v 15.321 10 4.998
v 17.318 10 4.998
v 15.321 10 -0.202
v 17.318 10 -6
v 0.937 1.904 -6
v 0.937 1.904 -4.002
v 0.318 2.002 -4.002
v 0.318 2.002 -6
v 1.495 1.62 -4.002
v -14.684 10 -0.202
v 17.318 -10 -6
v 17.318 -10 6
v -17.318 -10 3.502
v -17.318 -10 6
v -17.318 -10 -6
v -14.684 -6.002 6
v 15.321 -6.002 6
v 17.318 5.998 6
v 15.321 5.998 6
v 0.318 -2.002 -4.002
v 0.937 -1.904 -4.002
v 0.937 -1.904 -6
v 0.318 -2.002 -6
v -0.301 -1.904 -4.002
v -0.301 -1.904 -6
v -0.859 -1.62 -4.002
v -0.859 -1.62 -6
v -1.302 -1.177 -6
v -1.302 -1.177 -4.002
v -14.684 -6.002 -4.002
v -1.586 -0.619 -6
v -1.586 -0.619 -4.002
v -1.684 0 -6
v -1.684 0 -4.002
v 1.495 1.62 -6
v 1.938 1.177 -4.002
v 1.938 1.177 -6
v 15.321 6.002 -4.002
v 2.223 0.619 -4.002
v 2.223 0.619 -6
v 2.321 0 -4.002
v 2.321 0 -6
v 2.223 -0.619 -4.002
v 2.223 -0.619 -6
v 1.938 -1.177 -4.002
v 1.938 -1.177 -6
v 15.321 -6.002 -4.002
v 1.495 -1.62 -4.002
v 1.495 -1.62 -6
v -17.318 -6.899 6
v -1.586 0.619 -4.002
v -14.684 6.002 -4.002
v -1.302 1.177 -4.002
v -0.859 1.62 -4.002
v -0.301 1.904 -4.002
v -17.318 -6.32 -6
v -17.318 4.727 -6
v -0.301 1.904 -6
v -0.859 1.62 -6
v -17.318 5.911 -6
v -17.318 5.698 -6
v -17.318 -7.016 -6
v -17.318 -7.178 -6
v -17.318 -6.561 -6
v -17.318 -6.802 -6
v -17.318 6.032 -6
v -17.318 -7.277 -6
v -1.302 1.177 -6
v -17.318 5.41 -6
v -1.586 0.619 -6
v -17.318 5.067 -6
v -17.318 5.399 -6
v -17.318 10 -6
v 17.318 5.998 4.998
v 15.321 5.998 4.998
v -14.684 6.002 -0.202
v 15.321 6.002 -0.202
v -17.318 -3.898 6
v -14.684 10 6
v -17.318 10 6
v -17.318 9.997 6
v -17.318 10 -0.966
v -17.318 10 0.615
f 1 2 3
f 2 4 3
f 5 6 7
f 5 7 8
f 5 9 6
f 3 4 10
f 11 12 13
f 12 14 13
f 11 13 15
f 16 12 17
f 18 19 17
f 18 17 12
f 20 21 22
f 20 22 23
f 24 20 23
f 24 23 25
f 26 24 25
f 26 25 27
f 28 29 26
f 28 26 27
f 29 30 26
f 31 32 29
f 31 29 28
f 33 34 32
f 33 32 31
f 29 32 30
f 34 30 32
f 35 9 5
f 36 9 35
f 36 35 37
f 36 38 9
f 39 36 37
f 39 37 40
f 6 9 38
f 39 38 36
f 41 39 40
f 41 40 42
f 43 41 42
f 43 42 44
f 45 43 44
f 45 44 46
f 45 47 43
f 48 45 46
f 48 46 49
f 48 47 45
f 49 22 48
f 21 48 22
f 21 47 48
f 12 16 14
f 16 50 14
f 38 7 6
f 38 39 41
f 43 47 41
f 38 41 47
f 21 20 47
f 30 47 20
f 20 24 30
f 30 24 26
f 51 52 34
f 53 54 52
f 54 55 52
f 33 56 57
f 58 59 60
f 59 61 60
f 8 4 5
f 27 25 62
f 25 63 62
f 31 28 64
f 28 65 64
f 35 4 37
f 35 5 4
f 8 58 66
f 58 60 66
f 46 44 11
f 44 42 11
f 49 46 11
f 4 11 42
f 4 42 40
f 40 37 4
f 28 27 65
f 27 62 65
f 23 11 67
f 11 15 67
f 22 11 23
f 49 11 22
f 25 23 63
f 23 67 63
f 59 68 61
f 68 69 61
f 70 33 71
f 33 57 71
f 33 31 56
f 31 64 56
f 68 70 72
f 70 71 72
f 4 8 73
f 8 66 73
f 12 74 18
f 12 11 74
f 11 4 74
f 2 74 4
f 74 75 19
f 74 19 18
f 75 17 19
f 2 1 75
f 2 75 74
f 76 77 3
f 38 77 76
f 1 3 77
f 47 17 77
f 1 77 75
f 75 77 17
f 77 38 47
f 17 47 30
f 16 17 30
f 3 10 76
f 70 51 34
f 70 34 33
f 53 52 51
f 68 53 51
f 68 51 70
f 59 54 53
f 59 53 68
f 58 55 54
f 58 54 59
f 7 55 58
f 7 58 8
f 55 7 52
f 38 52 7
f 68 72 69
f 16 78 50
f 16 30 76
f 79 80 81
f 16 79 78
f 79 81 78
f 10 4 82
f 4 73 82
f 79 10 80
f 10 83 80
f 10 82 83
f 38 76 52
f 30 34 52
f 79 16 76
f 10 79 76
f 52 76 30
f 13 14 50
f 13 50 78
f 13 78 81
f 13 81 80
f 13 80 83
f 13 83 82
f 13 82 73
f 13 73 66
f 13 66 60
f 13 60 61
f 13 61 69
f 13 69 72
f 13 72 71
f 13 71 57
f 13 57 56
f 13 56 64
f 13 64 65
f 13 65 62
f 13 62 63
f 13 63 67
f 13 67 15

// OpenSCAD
// Parametric/customizer wrapper for the original hotbed_foot.stl geometry.
// Self-contained: this file does not import or reference the source STL.
// Defaults intentionally match hotbed_foot_v2.scad and the original STL dimensions.

/* [Foot body] */
// Use Original STL to keep the exact source dimensions.
foot_size_preset = "Original STL"; // [Original STL, Custom]
// Custom left-to-right size; used only when foot_size_preset is Custom.
custom_foot_length = 34.63543701; // [20:0.1:80]
// Custom front-to-back size; used only when foot_size_preset is Custom.
custom_foot_width = 20; // [10:0.1:60]
// Custom bottom-to-top size; used only when foot_size_preset is Custom.
custom_foot_height = 12; // [4:0.1:40]

/* [Large notch opening] */
// Original STL keeps the notch exactly as modeled in the STL.
large_notch_preset = "Original STL"; // [Original STL, Wider, Narrower, Deeper, Shallower, Custom]
// Custom left/right scale for the large notch area; used only when large_notch_preset is Custom.
custom_large_notch_width_scale = 1.00; // [0.5:0.01:1.5]
// Custom front/back scale for the large notch area; used only when large_notch_preset is Custom.
custom_large_notch_depth_scale = 1.00; // [0.5:0.01:1.5]

/* [Top wall notch] */
// Original Left matches the source STL. Mirrored Right flips the foot so the notch moves to the other side.
top_notch_side = "Original Left"; // [Original Left, Mirrored Right]

/* [Placement] */
// Centered opens visibly at the origin; Source STL places the part at the original STL coordinates.
model_position = "Centered"; // [Centered, Source STL]

orig_length = 34.63543701;
orig_width = 20;
orig_height = 12;
source_center = [149.8822937, 138.25900269, 6];

function resolved_length() = foot_size_preset == "Original STL" ? orig_length : custom_foot_length;
function resolved_width() = foot_size_preset == "Original STL" ? orig_width : custom_foot_width;
function resolved_height() = foot_size_preset == "Original STL" ? orig_height : custom_foot_height;

function large_notch_width_scale() =
  large_notch_preset == "Wider" ? 1.10 :
  large_notch_preset == "Narrower" ? 0.90 :
  large_notch_preset == "Custom" ? custom_large_notch_width_scale :
  1.00;

function large_notch_depth_scale() =
  large_notch_preset == "Deeper" ? 1.10 :
  large_notch_preset == "Shallower" ? 0.90 :
  large_notch_preset == "Custom" ? custom_large_notch_depth_scale :
  1.00;

module hotbed_foot_original_mesh_v4() {
  polyhedron(
    points = [
      [15.32070923, 10, 4.9980011],
      [17.31771851, 10, 4.9980011],
      [15.32070923, 10, -0.20199966],
      [17.31771851, 10, -6],
      [0.93670654, 1.9039917, -6],
      [0.93670654, 1.9039917, -4.0019989],
      [0.31771851, 2.0019989, -4.0019989],
      [0.31771851, 2.0019989, -6],
      [1.4947052, 1.61999512, -4.0019989],
      [-14.68429565, 10, -0.20199966],
      [17.31771851, -10, -6],
      [17.31771851, -10, 6],
      [-17.31771851, -10, 3.50236511],
      [-17.31771851, -10, 6],
      [-17.31771851, -10, -6],
      [-14.68429565, -6.0019989, 6],
      [15.32070923, -6.0019989, 6],
      [17.31771851, 5.9980011, 6],
      [15.32070923, 5.9980011, 6],
      [0.31771851, -2.0019989, -4.0019989],
      [0.93670654, -1.90400696, -4.0019989],
      [0.93670654, -1.90400696, -6],
      [0.31771851, -2.0019989, -6],
      [-0.30130005, -1.90400696, -4.0019989],
      [-0.30130005, -1.90400696, -6],
      [-0.85929871, -1.61999512, -4.0019989],
      [-0.85929871, -1.61999512, -6],
      [-1.30229187, -1.17700195, -6],
      [-1.30229187, -1.17700195, -4.0019989],
      [-14.68429565, -6.0019989, -4.0019989],
      [-1.58628845, -0.6190033, -6],
      [-1.58628845, -0.6190033, -4.0019989],
      [-1.68429565, 0, -6],
      [-1.68429565, 0, -4.0019989],
      [1.4947052, 1.61999512, -6],
      [1.93771362, 1.17700195, -4.0019989],
      [1.93771362, 1.17700195, -6],
      [15.32070923, 6.0019989, -4.0019989],
      [2.22271729, 0.61898804, -4.0019989],
      [2.22271729, 0.61898804, -6],
      [2.32070923, 0, -4.0019989],
      [2.32070923, 0, -6],
      [2.22271729, -0.6190033, -4.0019989],
      [2.22271729, -0.6190033, -6],
      [1.93771362, -1.17700195, -4.0019989],
      [1.93771362, -1.17700195, -6],
      [15.32070923, -6.0019989, -4.0019989],
      [1.4947052, -1.61999512, -4.0019989],
      [1.4947052, -1.61999512, -6],
      [-17.31771851, -6.89901733, 6],
      [-1.58628845, 0.61898804, -4.0019989],
      [-14.68429565, 6.0019989, -4.0019989],
      [-1.30229187, 1.17700195, -4.0019989],
      [-0.85929871, 1.61999512, -4.0019989],
      [-0.30130005, 1.9039917, -4.0019989],
      [-17.31771851, -6.31982422, -6],
      [-17.31771851, 4.72679138, -6],
      [-0.30130005, 1.9039917, -6],
      [-0.85929871, 1.61999512, -6],
      [-17.31771851, 5.91101074, -6],
      [-17.31771851, 5.69773865, -6],
      [-17.31771851, -7.01554871, -6],
      [-17.31771851, -7.17828369, -6],
      [-17.31771851, -6.56124878, -6],
      [-17.31771851, -6.80236816, -6],
      [-17.31771851, 6.03193665, -6],
      [-17.31771851, -7.27697754, -6],
      [-1.30229187, 1.17700195, -6],
      [-17.31771851, 5.41018677, -6],
      [-1.58628845, 0.61898804, -6],
      [-17.31771851, 5.06710815, -6],
      [-17.31771851, 5.39915466, -6],
      [-17.31771851, 10, -6],
      [17.31771851, 5.9980011, 4.9980011],
      [15.32070923, 5.9980011, 4.9980011],
      [-14.68429565, 6.0019989, -0.20199966],
      [15.32070923, 6.0019989, -0.20199966],
      [-17.31771851, -3.89782715, 6],
      [-14.68429565, 10, 6],
      [-17.31771851, 10, 6],
      [-17.31771851, 9.9969635, 6],
      [-17.31771851, 10, -0.96550751],
      [-17.31771851, 10, 0.61470413],
    ],
    faces = [
      [2, 1, 0],
      [2, 3, 1],
      [6, 5, 4],
      [7, 6, 4],
      [5, 8, 4],
      [9, 3, 2],
      [12, 11, 10],
      [12, 13, 11],
      [14, 12, 10],
      [16, 11, 15],
      [16, 18, 17],
      [11, 16, 17],
      [21, 20, 19],
      [22, 21, 19],
      [22, 19, 23],
      [24, 22, 23],
      [24, 23, 25],
      [26, 24, 25],
      [25, 28, 27],
      [26, 25, 27],
      [25, 29, 28],
      [28, 31, 30],
      [27, 28, 30],
      [31, 33, 32],
      [30, 31, 32],
      [29, 31, 28],
      [31, 29, 33],
      [4, 8, 34],
      [34, 8, 35],
      [36, 34, 35],
      [8, 37, 35],
      [36, 35, 38],
      [39, 36, 38],
      [37, 8, 5],
      [35, 37, 38],
      [39, 38, 40],
      [41, 39, 40],
      [41, 40, 42],
      [43, 41, 42],
      [43, 42, 44],
      [45, 43, 44],
      [42, 46, 44],
      [45, 44, 47],
      [48, 45, 47],
      [44, 46, 47],
      [47, 21, 48],
      [21, 47, 20],
      [47, 46, 20],
      [13, 15, 11],
      [13, 49, 15],
      [5, 6, 37],
      [40, 38, 37],
      [40, 46, 42],
      [46, 40, 37],
      [46, 19, 20],
      [19, 46, 29],
      [29, 23, 19],
      [25, 23, 29],
      [33, 51, 50],
      [51, 53, 52],
      [51, 54, 53],
      [56, 55, 32],
      [59, 58, 57],
      [59, 60, 58],
      [4, 3, 7],
      [61, 24, 26],
      [61, 62, 24],
      [63, 27, 30],
      [63, 64, 27],
      [36, 3, 34],
      [3, 4, 34],
      [65, 57, 7],
      [65, 59, 57],
      [10, 43, 45],
      [10, 41, 43],
      [10, 45, 48],
      [41, 10, 3],
      [39, 41, 3],
      [3, 36, 39],
      [64, 26, 27],
      [64, 61, 26],
      [66, 10, 22],
      [66, 14, 10],
      [22, 10, 21],
      [21, 10, 48],
      [62, 22, 24],
      [62, 66, 22],
      [60, 67, 58],
      [60, 68, 67],
      [70, 32, 69],
      [70, 56, 32],
      [55, 30, 32],
      [55, 63, 30],
      [71, 69, 67],
      [71, 70, 69],
      [72, 7, 3],
      [72, 65, 7],
      [17, 73, 11],
      [73, 10, 11],
      [73, 3, 10],
      [3, 73, 1],
      [18, 74, 73],
      [17, 18, 73],
      [18, 16, 74],
      [74, 0, 1],
      [73, 74, 1],
      [2, 76, 75],
      [75, 76, 37],
      [76, 2, 0],
      [76, 16, 46],
      [74, 76, 0],
      [16, 76, 74],
      [46, 37, 76],
      [29, 46, 16],
      [29, 16, 15],
      [75, 9, 2],
      [33, 50, 69],
      [32, 33, 69],
      [50, 51, 52],
      [50, 52, 67],
      [69, 50, 67],
      [52, 53, 58],
      [67, 52, 58],
      [53, 54, 57],
      [58, 53, 57],
      [57, 54, 6],
      [7, 57, 6],
      [51, 6, 54],
      [6, 51, 37],
      [68, 71, 67],
      [49, 77, 15],
      [75, 29, 15],
      [80, 79, 78],
      [77, 78, 15],
      [77, 80, 78],
      [81, 3, 9],
      [81, 72, 3],
      [79, 9, 78],
      [79, 82, 9],
      [82, 81, 9],
      [51, 75, 37],
      [51, 33, 29],
      [75, 15, 78],
      [75, 78, 9],
      [29, 75, 51],
      [49, 13, 12],
      [77, 49, 12],
      [80, 77, 12],
      [79, 80, 12],
      [82, 79, 12],
      [81, 82, 12],
      [72, 81, 12],
      [65, 72, 12],
      [59, 65, 12],
      [60, 59, 12],
      [68, 60, 12],
      [71, 68, 12],
      [70, 71, 12],
      [56, 70, 12],
      [55, 56, 12],
      [63, 55, 12],
      [64, 63, 12],
      [61, 64, 12],
      [62, 61, 12],
      [66, 62, 12],
      [14, 66, 12],
    ],
    convexity = 10
  );
}

module hotbed_foot_v4(
  position = model_position,
  notch_side = top_notch_side
) {
  placement = position == "Source STL" ? source_center : [0, 0, 0];
  body_scale = [resolved_length() / orig_length, resolved_width() / orig_width, resolved_height() / orig_height];
  notch_scale = [large_notch_width_scale(), large_notch_depth_scale(), 1];
  mirror_for_notch = notch_side == "Mirrored Right" ? [-1, 1, 1] : [1, 1, 1];

  translate(placement)
    scale(body_scale)
      scale(mirror_for_notch)
        // The notch-scale control is centered on the original mesh so Original STL remains exact at 1.00.
        scale(notch_scale)
          hotbed_foot_original_mesh_v4();
}

hotbed_foot_v4();
